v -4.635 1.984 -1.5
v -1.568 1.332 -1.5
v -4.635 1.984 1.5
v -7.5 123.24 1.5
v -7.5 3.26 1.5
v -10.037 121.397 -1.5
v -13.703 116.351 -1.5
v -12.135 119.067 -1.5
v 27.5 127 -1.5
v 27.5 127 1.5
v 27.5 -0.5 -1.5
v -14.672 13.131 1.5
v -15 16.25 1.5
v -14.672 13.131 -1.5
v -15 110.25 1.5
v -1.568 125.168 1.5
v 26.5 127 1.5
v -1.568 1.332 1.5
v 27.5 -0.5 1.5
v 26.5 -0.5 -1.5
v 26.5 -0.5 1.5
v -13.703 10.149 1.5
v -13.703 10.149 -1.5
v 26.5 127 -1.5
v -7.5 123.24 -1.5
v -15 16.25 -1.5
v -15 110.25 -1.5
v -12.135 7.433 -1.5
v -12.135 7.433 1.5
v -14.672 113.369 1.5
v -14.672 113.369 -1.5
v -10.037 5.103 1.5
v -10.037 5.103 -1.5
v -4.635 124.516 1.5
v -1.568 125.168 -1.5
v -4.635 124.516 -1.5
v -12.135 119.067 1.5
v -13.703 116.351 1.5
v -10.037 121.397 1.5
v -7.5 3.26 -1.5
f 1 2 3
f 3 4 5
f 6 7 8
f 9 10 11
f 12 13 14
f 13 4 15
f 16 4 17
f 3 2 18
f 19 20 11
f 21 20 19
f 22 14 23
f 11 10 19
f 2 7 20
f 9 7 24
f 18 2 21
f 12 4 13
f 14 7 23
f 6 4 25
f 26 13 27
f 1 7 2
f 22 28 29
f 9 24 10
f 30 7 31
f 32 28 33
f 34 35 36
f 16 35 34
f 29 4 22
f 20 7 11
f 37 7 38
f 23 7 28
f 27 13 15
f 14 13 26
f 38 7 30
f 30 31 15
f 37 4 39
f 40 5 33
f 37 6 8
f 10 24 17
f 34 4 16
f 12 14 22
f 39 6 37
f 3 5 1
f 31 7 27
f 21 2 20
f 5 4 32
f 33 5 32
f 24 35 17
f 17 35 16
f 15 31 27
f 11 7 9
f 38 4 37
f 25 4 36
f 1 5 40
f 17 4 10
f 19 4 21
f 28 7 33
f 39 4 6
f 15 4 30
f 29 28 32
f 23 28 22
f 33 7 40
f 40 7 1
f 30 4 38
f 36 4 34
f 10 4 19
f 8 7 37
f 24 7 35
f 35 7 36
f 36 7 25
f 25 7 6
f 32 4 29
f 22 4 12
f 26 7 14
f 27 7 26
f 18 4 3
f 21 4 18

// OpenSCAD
rad=15;
topL = 126.5;
bottomL = 124-rad;
h = 42-rad;
d=3;


hull(){
    translate([h,0,0])
    cube([1,1,d],true);
    translate([h,topL,0])
    cube([1,1,d],true);
    translate([0,((topL-bottomL)/2)+rad/2,0])
    union(){
        cylinder(r=rad, h=d,center= true);
        translate([0,bottomL-rad,0])
        cylinder(r=rad, h=d,center= true);
    }
}
